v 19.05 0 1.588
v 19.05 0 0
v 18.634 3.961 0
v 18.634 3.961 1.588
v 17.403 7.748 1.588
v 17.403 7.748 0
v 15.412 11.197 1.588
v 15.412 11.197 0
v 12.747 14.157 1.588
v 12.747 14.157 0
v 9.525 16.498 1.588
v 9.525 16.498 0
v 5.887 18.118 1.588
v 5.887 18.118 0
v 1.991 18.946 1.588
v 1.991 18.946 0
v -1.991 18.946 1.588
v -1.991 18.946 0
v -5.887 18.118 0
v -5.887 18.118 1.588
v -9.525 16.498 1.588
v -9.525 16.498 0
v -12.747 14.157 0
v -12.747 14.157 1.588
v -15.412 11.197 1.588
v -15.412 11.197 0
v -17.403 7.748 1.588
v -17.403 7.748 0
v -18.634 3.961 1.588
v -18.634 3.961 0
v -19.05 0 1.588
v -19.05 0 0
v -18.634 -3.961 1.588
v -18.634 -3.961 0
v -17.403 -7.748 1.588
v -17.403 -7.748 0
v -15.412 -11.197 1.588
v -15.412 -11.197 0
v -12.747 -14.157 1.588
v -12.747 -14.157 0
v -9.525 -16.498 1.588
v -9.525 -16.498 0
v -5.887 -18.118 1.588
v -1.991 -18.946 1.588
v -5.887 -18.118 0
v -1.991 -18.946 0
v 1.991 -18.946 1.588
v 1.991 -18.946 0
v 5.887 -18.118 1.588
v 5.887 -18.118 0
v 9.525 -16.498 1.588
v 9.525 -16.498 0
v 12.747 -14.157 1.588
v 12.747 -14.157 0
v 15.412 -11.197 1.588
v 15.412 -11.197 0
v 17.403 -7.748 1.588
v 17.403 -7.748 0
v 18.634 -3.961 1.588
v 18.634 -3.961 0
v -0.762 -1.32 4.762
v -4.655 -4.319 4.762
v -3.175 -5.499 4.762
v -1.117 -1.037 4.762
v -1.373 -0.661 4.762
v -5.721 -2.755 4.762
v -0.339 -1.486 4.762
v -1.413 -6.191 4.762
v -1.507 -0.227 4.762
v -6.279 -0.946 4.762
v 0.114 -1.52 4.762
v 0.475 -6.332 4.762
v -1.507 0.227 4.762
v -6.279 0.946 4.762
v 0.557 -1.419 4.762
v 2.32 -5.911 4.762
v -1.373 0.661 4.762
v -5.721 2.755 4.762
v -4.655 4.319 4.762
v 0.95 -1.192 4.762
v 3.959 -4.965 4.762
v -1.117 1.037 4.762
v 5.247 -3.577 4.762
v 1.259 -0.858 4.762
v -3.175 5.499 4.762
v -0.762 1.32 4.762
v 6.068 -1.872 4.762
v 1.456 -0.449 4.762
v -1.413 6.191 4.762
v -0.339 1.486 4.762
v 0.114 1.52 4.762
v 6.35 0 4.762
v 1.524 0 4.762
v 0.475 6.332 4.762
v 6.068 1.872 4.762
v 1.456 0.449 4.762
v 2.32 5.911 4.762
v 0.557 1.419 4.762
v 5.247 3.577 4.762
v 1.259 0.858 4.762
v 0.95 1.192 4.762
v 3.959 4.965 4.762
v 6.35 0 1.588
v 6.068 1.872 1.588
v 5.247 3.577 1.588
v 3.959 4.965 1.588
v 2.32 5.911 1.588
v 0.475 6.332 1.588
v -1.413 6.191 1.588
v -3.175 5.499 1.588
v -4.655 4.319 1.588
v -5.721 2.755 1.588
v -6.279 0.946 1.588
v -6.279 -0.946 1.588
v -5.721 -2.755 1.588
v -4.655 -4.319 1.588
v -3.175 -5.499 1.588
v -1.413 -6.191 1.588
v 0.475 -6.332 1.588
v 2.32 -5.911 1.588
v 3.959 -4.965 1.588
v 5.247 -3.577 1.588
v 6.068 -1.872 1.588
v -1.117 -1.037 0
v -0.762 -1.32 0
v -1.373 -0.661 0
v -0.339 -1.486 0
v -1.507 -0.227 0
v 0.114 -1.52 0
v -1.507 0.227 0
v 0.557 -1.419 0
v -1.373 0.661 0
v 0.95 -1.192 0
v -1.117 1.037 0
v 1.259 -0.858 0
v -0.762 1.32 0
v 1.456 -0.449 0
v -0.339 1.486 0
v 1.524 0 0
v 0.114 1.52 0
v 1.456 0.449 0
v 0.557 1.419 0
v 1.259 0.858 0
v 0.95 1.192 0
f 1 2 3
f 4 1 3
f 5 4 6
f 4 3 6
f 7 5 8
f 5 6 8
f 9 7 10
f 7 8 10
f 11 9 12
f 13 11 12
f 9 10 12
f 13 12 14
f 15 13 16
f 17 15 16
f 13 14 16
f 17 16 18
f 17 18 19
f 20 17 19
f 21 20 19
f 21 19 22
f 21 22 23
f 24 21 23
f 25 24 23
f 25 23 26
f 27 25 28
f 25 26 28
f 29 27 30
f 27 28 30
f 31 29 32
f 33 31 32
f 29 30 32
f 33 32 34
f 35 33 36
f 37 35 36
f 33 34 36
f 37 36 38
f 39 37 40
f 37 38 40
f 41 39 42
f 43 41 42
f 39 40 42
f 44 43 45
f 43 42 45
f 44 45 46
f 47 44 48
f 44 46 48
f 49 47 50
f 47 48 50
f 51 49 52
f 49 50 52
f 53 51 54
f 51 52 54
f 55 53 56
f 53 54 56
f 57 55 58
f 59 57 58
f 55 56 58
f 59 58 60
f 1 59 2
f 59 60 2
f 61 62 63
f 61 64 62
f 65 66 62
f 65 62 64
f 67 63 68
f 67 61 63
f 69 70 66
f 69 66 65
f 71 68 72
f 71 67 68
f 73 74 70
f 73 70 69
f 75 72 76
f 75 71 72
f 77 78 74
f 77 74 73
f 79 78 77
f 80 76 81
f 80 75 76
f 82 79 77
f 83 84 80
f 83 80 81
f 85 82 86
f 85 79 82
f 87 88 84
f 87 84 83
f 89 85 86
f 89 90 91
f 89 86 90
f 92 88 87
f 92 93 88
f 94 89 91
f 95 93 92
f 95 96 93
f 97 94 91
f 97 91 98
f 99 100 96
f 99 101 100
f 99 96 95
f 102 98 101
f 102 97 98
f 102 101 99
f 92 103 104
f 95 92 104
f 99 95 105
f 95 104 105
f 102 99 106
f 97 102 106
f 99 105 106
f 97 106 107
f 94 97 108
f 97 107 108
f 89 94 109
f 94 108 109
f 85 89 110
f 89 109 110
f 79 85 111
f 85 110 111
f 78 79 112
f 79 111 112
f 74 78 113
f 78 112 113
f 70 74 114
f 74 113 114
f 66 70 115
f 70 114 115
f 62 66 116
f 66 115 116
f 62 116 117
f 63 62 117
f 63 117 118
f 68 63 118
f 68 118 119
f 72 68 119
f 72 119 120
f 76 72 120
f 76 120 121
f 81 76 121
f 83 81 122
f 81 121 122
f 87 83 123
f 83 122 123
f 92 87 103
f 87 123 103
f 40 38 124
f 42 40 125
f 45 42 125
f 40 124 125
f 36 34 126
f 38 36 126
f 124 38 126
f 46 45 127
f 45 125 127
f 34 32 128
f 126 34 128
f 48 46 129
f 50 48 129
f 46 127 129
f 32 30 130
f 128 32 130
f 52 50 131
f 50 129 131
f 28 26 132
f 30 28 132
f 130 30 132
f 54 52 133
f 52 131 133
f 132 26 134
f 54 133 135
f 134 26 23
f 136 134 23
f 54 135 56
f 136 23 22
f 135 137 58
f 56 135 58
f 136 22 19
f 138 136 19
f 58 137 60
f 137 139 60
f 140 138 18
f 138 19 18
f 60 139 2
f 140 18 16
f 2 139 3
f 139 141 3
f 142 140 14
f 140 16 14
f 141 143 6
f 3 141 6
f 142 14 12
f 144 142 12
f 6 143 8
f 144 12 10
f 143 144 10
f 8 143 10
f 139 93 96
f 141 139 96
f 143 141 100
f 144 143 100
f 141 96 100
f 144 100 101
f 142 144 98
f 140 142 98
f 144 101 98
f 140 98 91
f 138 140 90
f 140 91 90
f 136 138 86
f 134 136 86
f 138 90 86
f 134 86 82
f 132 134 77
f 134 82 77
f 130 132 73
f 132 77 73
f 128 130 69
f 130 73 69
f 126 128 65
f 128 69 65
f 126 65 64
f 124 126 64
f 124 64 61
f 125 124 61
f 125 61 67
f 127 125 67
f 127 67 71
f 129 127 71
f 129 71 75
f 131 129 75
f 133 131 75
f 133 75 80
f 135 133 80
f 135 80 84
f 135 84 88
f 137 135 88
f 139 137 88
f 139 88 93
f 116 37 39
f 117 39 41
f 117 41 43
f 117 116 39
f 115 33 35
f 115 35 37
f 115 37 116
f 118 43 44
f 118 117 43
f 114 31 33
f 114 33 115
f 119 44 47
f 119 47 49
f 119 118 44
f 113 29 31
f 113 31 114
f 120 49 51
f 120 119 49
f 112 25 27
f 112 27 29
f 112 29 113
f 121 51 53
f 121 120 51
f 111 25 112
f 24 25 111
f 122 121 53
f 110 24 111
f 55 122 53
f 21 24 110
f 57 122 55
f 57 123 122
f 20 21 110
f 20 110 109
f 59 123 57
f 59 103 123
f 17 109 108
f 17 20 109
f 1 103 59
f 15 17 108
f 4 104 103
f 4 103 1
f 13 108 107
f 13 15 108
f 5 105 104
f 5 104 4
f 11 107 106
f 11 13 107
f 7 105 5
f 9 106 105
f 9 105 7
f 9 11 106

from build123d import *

# Parameters (mm, degrees)
F0_R     = 19.05
F1_DEPTH = 1.5875
F2_R     = 6.35
F3_DEPTH = 3.175
F4_R     = 1.524
F5_DEPTH = 4.7635


with BuildPart() as f1:
    # F0 (on Top) → F1 (new body)
    with BuildSketch(Plane.XY):
        Circle(F0_R)
    extrude(amount=F1_DEPTH)

    # F2 (on face) → F3 (join)
    with BuildSketch(Plane.XY.offset(1.5875)):
        Circle(F2_R)
    extrude(amount=F3_DEPTH)

    # F4 (on face) → F5 (cut, through all)
    with BuildSketch(Plane.XY.offset(4.7625)):
        Circle(F4_R)
    extrude(amount=-F5_DEPTH, mode=Mode.SUBTRACT)


solid = f1.part
